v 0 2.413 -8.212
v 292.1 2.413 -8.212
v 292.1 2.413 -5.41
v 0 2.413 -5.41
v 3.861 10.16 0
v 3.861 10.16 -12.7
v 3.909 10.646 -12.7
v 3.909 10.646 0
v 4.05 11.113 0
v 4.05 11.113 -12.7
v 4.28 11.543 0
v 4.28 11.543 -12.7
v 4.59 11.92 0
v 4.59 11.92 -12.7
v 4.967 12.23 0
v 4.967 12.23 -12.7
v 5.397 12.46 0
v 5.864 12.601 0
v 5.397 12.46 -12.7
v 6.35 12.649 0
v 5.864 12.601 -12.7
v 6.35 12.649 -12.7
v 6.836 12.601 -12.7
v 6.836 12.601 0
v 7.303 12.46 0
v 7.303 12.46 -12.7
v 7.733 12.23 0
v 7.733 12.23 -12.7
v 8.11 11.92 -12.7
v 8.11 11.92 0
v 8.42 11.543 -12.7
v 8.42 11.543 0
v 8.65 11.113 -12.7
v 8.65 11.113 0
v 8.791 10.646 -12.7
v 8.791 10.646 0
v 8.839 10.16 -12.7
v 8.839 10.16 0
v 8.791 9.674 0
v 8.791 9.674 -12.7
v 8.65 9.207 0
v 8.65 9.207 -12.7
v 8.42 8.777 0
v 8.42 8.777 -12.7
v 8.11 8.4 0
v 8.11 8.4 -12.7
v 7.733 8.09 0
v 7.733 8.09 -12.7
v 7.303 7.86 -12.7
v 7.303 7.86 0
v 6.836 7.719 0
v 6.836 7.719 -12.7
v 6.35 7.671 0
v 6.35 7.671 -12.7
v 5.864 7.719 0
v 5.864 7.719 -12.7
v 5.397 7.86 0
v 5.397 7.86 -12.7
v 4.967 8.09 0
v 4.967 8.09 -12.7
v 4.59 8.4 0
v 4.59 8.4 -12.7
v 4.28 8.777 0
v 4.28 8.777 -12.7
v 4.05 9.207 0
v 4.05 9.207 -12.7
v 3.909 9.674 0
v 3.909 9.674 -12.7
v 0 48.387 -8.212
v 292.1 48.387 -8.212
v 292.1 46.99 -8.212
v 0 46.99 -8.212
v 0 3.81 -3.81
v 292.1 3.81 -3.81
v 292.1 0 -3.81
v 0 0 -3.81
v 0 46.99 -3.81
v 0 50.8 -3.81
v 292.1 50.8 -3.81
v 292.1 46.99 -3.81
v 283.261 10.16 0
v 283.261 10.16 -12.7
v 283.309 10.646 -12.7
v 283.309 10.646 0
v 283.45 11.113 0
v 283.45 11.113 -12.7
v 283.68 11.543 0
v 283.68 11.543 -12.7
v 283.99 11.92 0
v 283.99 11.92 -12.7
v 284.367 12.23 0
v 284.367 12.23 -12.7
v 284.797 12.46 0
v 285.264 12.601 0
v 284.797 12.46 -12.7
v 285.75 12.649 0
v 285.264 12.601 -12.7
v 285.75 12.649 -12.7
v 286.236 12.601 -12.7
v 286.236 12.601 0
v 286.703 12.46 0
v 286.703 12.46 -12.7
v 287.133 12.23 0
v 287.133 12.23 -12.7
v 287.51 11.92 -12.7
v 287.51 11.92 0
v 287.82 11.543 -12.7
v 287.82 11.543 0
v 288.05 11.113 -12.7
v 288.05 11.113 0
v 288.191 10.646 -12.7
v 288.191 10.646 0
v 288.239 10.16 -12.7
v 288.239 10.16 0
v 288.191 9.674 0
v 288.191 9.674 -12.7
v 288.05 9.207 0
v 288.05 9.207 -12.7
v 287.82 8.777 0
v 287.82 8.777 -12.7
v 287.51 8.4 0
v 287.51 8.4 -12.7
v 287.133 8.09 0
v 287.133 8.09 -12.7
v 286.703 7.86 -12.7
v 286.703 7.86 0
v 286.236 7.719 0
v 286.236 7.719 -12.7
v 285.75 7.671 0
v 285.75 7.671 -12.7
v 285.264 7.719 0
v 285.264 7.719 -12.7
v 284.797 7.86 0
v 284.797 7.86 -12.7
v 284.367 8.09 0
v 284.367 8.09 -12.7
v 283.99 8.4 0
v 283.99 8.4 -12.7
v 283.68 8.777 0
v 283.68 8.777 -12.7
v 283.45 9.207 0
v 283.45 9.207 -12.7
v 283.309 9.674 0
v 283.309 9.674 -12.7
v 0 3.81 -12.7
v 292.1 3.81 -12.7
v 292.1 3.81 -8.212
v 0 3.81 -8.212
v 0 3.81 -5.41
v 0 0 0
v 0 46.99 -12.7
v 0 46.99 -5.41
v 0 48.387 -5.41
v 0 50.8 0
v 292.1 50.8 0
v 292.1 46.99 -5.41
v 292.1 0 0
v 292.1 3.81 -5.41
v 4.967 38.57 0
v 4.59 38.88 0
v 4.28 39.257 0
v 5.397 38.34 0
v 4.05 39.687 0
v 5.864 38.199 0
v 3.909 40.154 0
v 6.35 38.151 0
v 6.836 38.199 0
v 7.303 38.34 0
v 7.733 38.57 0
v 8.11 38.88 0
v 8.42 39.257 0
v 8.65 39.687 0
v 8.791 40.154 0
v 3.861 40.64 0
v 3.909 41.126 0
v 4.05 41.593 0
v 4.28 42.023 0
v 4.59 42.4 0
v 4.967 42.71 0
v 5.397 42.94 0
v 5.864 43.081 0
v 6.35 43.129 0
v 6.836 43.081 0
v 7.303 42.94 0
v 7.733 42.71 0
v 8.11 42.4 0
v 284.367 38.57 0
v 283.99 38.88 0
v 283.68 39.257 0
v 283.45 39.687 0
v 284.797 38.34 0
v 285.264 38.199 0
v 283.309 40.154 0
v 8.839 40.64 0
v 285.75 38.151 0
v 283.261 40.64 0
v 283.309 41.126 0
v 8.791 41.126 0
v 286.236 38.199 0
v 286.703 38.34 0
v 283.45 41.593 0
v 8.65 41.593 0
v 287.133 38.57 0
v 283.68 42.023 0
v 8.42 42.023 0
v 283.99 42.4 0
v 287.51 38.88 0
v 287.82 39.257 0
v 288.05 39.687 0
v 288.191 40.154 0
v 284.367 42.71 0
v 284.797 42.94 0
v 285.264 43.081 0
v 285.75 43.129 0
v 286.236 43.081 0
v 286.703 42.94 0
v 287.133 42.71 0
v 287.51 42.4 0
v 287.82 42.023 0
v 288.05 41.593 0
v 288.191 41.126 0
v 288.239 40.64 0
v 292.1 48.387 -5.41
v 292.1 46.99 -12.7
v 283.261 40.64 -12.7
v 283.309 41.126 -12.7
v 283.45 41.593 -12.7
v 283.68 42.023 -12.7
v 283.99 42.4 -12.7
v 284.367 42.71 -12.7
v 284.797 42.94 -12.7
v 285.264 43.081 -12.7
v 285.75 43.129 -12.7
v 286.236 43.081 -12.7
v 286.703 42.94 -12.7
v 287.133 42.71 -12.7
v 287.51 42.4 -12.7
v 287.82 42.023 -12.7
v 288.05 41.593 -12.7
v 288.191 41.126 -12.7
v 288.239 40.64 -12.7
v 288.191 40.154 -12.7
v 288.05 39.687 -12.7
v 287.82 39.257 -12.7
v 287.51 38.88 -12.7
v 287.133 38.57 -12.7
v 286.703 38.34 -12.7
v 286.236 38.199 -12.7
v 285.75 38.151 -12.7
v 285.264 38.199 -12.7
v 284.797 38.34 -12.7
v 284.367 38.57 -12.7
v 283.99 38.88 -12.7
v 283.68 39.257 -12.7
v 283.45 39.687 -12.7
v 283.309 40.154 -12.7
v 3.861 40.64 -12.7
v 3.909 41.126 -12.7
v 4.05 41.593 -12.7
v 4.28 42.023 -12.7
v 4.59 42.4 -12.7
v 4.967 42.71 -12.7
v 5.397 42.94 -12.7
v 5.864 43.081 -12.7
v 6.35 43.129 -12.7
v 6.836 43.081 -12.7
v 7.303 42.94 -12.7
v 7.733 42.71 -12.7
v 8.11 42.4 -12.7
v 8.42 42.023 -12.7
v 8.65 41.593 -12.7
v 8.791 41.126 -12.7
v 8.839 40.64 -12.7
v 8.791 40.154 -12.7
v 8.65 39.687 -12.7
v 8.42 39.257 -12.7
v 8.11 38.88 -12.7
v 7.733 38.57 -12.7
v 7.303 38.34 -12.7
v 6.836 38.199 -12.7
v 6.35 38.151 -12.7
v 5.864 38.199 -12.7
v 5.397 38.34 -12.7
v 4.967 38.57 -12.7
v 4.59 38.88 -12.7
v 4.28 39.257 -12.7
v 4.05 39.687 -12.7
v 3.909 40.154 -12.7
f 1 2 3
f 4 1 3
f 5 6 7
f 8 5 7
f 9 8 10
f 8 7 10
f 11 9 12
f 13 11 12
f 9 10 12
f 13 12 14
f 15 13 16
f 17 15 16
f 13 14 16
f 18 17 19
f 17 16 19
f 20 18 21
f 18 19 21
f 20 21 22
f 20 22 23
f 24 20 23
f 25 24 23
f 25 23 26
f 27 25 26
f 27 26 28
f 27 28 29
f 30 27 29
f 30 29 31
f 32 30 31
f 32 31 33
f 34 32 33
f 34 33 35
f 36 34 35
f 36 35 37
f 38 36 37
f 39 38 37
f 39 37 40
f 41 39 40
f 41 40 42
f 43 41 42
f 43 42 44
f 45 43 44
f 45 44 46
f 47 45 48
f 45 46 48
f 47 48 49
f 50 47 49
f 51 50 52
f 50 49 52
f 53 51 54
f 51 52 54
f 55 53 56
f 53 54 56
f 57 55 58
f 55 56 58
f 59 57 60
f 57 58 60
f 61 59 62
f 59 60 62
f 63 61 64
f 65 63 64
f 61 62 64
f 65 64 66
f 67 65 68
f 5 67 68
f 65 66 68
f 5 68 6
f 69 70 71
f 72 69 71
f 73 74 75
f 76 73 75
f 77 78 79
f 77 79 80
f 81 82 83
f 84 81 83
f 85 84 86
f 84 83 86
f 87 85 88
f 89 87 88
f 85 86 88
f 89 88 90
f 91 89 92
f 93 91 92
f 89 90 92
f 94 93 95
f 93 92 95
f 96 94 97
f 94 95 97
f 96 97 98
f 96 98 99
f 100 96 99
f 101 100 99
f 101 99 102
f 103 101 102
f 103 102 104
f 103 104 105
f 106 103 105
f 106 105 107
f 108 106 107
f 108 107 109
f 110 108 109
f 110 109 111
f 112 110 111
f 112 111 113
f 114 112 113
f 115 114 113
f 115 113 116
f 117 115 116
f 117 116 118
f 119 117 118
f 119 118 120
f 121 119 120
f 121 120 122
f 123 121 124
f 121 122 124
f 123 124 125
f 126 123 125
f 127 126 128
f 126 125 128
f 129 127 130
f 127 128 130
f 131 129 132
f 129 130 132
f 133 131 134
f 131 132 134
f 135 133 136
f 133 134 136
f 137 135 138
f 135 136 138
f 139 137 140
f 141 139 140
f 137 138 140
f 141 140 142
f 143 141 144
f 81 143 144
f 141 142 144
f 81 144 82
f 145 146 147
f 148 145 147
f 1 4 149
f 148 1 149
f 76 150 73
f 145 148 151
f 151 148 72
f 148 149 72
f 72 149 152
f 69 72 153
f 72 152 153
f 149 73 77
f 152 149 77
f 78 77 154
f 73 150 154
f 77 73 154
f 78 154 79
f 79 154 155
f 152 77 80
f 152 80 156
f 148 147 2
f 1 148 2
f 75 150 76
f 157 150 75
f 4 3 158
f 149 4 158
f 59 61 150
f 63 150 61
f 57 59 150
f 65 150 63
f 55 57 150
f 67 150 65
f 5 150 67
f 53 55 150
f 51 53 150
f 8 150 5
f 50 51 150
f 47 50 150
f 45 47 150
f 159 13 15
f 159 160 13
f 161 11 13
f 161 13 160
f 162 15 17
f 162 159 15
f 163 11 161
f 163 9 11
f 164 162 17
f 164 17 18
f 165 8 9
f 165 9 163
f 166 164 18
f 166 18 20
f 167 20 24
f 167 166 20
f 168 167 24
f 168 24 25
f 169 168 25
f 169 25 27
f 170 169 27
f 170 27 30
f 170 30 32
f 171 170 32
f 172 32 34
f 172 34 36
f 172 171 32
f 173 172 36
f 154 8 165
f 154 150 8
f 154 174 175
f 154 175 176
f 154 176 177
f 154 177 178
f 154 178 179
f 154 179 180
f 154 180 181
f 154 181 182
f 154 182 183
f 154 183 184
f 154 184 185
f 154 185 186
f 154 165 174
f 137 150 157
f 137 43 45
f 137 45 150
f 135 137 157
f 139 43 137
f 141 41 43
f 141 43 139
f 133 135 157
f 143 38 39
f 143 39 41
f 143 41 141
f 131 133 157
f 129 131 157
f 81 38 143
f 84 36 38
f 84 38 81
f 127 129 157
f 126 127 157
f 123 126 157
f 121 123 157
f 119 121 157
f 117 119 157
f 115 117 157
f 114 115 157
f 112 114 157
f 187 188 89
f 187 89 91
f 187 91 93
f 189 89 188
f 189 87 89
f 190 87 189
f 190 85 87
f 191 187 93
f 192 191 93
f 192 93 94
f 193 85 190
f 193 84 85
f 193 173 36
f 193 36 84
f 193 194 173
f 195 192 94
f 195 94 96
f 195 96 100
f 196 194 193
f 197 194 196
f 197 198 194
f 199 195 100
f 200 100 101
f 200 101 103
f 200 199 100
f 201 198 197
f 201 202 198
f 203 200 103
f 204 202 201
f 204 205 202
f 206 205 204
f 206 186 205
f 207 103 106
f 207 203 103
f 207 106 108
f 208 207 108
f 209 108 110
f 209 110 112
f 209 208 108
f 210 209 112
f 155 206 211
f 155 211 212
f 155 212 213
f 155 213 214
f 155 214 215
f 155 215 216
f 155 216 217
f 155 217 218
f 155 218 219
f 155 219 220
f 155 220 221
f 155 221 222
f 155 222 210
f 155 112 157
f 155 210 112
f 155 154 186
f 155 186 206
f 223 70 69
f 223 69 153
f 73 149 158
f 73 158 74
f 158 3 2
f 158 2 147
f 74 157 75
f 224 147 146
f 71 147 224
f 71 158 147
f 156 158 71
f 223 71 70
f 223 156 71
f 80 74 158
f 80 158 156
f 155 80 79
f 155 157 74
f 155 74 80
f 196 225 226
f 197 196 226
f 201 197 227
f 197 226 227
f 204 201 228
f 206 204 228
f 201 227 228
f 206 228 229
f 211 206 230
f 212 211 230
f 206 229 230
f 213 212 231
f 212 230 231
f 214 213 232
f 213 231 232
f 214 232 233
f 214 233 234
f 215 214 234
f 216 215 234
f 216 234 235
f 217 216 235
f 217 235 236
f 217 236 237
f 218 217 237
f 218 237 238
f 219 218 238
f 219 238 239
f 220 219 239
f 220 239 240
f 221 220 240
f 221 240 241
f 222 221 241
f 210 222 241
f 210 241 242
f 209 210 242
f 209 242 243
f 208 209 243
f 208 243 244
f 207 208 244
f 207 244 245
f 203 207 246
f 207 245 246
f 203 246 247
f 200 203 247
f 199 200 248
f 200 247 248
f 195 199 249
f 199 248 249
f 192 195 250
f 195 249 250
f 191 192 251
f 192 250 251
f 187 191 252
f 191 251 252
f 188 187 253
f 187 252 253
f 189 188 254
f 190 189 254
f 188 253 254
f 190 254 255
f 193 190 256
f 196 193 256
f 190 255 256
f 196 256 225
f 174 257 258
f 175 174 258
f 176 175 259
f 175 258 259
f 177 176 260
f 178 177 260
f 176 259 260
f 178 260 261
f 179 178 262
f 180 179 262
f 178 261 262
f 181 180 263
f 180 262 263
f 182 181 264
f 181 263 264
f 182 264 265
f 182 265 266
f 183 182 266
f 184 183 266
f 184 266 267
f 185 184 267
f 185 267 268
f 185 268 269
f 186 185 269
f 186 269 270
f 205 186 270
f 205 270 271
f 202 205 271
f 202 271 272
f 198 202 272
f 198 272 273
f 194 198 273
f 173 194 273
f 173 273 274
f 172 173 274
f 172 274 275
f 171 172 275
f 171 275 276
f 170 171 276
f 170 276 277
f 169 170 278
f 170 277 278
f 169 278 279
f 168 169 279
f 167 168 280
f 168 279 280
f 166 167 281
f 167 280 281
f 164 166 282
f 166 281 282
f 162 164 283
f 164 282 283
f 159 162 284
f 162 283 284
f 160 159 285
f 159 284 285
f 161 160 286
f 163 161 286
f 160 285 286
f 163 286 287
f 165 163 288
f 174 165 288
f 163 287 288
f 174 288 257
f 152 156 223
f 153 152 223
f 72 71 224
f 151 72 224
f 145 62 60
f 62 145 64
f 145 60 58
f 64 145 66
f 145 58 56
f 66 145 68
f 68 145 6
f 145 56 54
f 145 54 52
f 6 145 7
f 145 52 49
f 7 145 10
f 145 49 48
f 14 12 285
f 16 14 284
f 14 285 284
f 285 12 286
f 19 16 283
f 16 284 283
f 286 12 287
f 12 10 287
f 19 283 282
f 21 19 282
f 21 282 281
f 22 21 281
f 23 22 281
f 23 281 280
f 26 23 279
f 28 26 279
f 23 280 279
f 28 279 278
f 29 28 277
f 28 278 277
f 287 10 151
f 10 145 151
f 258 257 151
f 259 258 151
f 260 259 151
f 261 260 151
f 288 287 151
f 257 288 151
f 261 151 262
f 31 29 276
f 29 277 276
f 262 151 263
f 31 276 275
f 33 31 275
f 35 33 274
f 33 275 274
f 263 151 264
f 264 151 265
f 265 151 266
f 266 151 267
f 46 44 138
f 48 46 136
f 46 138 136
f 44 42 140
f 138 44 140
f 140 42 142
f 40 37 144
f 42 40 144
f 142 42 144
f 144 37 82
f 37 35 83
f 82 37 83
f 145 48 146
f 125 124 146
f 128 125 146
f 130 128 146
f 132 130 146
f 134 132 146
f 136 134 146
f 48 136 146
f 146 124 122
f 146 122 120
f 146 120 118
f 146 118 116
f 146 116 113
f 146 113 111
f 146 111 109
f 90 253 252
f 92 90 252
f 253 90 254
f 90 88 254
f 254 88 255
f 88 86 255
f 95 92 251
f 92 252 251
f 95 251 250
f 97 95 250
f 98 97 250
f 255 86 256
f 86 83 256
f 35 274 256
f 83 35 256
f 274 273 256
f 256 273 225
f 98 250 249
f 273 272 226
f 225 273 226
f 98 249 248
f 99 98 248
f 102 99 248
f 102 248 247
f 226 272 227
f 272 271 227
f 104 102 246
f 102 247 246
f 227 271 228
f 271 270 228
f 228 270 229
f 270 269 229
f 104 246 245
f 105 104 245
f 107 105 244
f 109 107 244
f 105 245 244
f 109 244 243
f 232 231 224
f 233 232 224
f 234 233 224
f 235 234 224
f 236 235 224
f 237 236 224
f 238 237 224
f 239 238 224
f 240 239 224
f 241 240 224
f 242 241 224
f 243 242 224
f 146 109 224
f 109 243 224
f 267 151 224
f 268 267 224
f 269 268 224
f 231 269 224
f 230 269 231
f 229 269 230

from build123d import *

# Parameters (mm, degrees)
F0_W     = 292.1
F0_H     = 50.8
F1_DEPTH = 12.7
F6_D     = 4.9784
F7_W     = 2.413
F7_H     = 2.8018399096
F8_DEPTH = 292.1


with BuildPart() as f1:
    # F0 (on Top) → F1 (new body)
    with BuildSketch(Plane.XY):
        with Locations((146.05, 25.4)):
            Rectangle(F0_W, F0_H)
    extrude(amount=-F1_DEPTH)

    # F6 (through all)
    with Locations(Plane.XY):
        with Locations((6.35, 40.64), (285.75, 40.64), (285.75, 10.16), (6.35, 10.16)):
            Hole(F6_D / 2)

    # F7 (on face) → F8 (cut, through all)
    with BuildSketch(Plane.YZ.offset(292.1)):
        Polygon((3.81, -3.81), (0, -3.81), (0, -5.4102), (2.413, -5.4102), (3.81, -5.4102), align=None)
        with Locations((1.2065, -6.8111199548)):
            Rectangle(F7_W, F7_H)
        Polygon((2.413, -8.2120399096), (0, -8.2120399096), (0, -12.7), (3.81, -12.7), (3.81, -8.2120399096), align=None)
        Polygon((50.8, -5.4102), (50.8, -3.81), (46.99, -3.81), (46.99, -5.4102), (48.387, -5.4102), align=None)
        with Locations((49.5935, -6.8111199548)):
            Rectangle(F7_W, F7_H)
        Polygon((46.99, -8.2120399096), (46.99, -12.7), (50.8, -12.7), (50.8, -8.2120399096), (48.387, -8.2120399096), align=None)
    extrude(amount=-F8_DEPTH, mode=Mode.SUBTRACT)


solid = f1.part
